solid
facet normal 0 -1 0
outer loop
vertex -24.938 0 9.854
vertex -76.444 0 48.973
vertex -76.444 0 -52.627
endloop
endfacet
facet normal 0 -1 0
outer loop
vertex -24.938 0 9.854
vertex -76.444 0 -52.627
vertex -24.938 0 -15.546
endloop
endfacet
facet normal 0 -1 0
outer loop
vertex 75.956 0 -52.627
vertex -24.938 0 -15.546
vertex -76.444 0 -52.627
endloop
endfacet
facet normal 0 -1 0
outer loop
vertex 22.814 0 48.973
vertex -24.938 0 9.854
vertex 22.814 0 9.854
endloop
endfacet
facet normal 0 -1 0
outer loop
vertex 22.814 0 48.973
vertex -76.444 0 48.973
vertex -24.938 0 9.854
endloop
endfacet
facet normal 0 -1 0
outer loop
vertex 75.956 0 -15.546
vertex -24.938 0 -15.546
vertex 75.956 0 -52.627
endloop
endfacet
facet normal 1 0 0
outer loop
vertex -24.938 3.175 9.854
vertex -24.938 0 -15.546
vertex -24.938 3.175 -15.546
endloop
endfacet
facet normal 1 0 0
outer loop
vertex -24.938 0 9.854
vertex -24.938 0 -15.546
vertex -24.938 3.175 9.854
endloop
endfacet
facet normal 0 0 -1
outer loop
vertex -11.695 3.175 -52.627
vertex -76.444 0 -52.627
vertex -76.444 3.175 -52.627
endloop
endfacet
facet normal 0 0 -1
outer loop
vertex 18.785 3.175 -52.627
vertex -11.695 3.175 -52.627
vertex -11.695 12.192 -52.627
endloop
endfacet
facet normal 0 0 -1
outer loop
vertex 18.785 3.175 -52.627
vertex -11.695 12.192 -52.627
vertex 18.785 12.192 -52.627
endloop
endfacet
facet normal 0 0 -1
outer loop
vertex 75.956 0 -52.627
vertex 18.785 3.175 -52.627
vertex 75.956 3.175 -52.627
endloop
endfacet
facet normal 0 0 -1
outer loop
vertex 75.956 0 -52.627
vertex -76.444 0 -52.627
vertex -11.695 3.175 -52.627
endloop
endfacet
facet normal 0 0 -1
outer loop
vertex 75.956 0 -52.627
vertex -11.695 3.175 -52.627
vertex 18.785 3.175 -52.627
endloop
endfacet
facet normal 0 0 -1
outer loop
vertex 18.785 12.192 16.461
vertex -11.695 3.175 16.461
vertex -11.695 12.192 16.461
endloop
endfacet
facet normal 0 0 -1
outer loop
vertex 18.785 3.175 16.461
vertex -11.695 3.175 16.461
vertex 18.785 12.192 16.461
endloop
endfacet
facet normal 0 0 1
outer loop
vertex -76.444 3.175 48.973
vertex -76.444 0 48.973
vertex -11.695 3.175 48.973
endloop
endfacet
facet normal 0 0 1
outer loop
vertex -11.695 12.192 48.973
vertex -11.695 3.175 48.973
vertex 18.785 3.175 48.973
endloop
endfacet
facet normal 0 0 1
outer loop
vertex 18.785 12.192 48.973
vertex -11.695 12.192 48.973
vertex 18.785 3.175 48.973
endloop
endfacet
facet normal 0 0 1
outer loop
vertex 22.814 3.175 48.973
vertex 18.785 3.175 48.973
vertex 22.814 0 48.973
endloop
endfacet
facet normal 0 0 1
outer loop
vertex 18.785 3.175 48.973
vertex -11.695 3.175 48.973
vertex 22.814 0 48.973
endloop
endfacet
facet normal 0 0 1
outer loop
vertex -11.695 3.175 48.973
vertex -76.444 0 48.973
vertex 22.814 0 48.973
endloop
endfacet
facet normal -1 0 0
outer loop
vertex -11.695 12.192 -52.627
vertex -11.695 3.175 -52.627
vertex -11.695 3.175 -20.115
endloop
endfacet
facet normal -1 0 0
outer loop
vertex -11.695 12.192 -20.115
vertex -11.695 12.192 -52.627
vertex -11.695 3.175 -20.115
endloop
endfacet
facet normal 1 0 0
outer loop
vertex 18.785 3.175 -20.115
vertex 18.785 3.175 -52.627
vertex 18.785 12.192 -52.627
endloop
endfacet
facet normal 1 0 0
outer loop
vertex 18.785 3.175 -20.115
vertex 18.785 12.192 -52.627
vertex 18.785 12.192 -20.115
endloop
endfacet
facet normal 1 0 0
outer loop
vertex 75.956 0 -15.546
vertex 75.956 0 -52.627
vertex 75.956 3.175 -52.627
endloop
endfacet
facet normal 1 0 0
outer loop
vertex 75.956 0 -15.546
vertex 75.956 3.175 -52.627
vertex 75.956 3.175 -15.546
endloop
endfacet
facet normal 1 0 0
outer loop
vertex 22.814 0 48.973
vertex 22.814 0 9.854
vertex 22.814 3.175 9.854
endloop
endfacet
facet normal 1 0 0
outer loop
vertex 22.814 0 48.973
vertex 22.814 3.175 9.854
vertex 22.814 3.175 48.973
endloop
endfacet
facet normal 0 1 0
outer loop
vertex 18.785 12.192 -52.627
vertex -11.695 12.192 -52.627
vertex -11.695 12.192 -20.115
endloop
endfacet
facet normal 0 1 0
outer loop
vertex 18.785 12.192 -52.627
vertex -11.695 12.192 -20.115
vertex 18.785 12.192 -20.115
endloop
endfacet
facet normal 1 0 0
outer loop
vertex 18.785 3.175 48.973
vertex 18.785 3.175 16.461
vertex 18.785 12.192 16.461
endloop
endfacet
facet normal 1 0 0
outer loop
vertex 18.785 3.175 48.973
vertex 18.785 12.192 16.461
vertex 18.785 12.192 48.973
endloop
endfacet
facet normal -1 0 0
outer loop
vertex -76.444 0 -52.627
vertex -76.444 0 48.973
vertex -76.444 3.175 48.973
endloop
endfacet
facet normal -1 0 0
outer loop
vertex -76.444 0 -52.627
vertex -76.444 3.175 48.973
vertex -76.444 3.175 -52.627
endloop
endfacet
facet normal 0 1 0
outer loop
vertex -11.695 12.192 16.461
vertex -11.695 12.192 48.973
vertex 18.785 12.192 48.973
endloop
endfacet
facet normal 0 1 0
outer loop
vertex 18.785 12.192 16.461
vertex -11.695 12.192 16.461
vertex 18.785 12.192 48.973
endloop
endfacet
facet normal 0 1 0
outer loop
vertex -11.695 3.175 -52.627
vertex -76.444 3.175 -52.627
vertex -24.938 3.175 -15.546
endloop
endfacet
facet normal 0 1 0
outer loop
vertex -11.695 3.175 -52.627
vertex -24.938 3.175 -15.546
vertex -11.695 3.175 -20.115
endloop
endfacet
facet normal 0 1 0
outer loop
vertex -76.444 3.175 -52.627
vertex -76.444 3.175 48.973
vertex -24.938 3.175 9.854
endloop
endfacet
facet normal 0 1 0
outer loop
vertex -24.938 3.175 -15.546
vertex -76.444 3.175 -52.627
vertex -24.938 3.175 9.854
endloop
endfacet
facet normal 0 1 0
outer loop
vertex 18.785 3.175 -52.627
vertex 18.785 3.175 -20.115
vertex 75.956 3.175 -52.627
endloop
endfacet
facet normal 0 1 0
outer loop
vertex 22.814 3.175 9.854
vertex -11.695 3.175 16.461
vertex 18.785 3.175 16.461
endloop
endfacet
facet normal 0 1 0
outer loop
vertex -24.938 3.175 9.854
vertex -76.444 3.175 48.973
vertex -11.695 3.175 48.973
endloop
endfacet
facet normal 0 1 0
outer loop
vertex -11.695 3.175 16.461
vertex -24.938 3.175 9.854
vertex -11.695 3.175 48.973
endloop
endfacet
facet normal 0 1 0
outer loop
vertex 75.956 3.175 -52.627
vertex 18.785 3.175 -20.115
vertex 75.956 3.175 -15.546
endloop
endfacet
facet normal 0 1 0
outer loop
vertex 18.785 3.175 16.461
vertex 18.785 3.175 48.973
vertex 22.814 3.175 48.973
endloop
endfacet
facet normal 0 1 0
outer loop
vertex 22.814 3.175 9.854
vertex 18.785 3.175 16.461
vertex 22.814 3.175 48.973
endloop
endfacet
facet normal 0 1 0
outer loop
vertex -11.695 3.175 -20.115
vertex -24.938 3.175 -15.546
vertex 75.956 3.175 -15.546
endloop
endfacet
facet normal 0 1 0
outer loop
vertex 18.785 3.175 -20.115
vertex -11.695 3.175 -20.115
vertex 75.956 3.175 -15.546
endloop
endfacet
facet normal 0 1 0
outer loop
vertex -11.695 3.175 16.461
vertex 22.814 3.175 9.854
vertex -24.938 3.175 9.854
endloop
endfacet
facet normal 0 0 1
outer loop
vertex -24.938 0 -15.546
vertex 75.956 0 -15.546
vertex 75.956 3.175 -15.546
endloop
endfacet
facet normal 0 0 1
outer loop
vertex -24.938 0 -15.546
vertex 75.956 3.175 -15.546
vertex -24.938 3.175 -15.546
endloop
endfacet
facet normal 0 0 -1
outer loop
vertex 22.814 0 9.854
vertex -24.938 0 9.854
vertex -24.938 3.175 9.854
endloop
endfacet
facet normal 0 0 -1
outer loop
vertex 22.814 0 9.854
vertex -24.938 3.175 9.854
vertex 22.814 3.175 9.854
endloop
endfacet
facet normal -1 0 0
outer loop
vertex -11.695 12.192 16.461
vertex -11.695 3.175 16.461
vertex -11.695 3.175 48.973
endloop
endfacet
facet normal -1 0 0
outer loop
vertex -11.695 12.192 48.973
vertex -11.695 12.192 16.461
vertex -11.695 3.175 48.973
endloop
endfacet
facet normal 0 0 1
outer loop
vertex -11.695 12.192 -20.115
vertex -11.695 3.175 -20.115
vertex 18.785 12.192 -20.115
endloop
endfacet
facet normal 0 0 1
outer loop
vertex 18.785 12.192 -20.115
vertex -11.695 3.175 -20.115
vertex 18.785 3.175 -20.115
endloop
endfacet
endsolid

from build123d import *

# Parameters (mm, degrees)
F1_DEPTH = 3.175
F0_W     = 30.48
F0_H     = 32.512
F2_DEPTH = 12.192


with BuildPart() as f1:
    # F0 (on Front) → F1 (new body)
    with BuildSketch(Plane.XZ):
        Polygon((-11.6948662326, 48.9731033504), (-76.444491744, 48.9731033504), (-76.444491744, -52.6268966496), (-11.6948662326, -52.6268966496), (-11.6948662326, -20.1148966496), (18.7851337674, -20.1148966496), (18.7851337674, -52.6268966496), (75.955508256, -52.6268966496), (75.955508256, -15.5456149951), (22.8138189573, -15.5456149951), (-24.9381810427, -15.5456149951), (-24.9381810427, 9.8543850049), (22.8138189573, 9.8543850049), (22.8138189573, 48.9731033504), (18.7851337674, 48.9731033504), (18.7851337674, 16.4611033504), (-11.6948662326, 16.4611033504), align=None)
    extrude(amount=-F1_DEPTH)

    # F0 (on Front) → F2 (join)
    with BuildSketch(Plane.XZ):
        with Locations((3.5451337674, 32.7171033504)):
            Rectangle(F0_W, F0_H)
        with Locations((3.5451337674, -36.3708966496)):
            Rectangle(F0_W, F0_H)
    extrude(amount=-F2_DEPTH)


solid = f1.part
